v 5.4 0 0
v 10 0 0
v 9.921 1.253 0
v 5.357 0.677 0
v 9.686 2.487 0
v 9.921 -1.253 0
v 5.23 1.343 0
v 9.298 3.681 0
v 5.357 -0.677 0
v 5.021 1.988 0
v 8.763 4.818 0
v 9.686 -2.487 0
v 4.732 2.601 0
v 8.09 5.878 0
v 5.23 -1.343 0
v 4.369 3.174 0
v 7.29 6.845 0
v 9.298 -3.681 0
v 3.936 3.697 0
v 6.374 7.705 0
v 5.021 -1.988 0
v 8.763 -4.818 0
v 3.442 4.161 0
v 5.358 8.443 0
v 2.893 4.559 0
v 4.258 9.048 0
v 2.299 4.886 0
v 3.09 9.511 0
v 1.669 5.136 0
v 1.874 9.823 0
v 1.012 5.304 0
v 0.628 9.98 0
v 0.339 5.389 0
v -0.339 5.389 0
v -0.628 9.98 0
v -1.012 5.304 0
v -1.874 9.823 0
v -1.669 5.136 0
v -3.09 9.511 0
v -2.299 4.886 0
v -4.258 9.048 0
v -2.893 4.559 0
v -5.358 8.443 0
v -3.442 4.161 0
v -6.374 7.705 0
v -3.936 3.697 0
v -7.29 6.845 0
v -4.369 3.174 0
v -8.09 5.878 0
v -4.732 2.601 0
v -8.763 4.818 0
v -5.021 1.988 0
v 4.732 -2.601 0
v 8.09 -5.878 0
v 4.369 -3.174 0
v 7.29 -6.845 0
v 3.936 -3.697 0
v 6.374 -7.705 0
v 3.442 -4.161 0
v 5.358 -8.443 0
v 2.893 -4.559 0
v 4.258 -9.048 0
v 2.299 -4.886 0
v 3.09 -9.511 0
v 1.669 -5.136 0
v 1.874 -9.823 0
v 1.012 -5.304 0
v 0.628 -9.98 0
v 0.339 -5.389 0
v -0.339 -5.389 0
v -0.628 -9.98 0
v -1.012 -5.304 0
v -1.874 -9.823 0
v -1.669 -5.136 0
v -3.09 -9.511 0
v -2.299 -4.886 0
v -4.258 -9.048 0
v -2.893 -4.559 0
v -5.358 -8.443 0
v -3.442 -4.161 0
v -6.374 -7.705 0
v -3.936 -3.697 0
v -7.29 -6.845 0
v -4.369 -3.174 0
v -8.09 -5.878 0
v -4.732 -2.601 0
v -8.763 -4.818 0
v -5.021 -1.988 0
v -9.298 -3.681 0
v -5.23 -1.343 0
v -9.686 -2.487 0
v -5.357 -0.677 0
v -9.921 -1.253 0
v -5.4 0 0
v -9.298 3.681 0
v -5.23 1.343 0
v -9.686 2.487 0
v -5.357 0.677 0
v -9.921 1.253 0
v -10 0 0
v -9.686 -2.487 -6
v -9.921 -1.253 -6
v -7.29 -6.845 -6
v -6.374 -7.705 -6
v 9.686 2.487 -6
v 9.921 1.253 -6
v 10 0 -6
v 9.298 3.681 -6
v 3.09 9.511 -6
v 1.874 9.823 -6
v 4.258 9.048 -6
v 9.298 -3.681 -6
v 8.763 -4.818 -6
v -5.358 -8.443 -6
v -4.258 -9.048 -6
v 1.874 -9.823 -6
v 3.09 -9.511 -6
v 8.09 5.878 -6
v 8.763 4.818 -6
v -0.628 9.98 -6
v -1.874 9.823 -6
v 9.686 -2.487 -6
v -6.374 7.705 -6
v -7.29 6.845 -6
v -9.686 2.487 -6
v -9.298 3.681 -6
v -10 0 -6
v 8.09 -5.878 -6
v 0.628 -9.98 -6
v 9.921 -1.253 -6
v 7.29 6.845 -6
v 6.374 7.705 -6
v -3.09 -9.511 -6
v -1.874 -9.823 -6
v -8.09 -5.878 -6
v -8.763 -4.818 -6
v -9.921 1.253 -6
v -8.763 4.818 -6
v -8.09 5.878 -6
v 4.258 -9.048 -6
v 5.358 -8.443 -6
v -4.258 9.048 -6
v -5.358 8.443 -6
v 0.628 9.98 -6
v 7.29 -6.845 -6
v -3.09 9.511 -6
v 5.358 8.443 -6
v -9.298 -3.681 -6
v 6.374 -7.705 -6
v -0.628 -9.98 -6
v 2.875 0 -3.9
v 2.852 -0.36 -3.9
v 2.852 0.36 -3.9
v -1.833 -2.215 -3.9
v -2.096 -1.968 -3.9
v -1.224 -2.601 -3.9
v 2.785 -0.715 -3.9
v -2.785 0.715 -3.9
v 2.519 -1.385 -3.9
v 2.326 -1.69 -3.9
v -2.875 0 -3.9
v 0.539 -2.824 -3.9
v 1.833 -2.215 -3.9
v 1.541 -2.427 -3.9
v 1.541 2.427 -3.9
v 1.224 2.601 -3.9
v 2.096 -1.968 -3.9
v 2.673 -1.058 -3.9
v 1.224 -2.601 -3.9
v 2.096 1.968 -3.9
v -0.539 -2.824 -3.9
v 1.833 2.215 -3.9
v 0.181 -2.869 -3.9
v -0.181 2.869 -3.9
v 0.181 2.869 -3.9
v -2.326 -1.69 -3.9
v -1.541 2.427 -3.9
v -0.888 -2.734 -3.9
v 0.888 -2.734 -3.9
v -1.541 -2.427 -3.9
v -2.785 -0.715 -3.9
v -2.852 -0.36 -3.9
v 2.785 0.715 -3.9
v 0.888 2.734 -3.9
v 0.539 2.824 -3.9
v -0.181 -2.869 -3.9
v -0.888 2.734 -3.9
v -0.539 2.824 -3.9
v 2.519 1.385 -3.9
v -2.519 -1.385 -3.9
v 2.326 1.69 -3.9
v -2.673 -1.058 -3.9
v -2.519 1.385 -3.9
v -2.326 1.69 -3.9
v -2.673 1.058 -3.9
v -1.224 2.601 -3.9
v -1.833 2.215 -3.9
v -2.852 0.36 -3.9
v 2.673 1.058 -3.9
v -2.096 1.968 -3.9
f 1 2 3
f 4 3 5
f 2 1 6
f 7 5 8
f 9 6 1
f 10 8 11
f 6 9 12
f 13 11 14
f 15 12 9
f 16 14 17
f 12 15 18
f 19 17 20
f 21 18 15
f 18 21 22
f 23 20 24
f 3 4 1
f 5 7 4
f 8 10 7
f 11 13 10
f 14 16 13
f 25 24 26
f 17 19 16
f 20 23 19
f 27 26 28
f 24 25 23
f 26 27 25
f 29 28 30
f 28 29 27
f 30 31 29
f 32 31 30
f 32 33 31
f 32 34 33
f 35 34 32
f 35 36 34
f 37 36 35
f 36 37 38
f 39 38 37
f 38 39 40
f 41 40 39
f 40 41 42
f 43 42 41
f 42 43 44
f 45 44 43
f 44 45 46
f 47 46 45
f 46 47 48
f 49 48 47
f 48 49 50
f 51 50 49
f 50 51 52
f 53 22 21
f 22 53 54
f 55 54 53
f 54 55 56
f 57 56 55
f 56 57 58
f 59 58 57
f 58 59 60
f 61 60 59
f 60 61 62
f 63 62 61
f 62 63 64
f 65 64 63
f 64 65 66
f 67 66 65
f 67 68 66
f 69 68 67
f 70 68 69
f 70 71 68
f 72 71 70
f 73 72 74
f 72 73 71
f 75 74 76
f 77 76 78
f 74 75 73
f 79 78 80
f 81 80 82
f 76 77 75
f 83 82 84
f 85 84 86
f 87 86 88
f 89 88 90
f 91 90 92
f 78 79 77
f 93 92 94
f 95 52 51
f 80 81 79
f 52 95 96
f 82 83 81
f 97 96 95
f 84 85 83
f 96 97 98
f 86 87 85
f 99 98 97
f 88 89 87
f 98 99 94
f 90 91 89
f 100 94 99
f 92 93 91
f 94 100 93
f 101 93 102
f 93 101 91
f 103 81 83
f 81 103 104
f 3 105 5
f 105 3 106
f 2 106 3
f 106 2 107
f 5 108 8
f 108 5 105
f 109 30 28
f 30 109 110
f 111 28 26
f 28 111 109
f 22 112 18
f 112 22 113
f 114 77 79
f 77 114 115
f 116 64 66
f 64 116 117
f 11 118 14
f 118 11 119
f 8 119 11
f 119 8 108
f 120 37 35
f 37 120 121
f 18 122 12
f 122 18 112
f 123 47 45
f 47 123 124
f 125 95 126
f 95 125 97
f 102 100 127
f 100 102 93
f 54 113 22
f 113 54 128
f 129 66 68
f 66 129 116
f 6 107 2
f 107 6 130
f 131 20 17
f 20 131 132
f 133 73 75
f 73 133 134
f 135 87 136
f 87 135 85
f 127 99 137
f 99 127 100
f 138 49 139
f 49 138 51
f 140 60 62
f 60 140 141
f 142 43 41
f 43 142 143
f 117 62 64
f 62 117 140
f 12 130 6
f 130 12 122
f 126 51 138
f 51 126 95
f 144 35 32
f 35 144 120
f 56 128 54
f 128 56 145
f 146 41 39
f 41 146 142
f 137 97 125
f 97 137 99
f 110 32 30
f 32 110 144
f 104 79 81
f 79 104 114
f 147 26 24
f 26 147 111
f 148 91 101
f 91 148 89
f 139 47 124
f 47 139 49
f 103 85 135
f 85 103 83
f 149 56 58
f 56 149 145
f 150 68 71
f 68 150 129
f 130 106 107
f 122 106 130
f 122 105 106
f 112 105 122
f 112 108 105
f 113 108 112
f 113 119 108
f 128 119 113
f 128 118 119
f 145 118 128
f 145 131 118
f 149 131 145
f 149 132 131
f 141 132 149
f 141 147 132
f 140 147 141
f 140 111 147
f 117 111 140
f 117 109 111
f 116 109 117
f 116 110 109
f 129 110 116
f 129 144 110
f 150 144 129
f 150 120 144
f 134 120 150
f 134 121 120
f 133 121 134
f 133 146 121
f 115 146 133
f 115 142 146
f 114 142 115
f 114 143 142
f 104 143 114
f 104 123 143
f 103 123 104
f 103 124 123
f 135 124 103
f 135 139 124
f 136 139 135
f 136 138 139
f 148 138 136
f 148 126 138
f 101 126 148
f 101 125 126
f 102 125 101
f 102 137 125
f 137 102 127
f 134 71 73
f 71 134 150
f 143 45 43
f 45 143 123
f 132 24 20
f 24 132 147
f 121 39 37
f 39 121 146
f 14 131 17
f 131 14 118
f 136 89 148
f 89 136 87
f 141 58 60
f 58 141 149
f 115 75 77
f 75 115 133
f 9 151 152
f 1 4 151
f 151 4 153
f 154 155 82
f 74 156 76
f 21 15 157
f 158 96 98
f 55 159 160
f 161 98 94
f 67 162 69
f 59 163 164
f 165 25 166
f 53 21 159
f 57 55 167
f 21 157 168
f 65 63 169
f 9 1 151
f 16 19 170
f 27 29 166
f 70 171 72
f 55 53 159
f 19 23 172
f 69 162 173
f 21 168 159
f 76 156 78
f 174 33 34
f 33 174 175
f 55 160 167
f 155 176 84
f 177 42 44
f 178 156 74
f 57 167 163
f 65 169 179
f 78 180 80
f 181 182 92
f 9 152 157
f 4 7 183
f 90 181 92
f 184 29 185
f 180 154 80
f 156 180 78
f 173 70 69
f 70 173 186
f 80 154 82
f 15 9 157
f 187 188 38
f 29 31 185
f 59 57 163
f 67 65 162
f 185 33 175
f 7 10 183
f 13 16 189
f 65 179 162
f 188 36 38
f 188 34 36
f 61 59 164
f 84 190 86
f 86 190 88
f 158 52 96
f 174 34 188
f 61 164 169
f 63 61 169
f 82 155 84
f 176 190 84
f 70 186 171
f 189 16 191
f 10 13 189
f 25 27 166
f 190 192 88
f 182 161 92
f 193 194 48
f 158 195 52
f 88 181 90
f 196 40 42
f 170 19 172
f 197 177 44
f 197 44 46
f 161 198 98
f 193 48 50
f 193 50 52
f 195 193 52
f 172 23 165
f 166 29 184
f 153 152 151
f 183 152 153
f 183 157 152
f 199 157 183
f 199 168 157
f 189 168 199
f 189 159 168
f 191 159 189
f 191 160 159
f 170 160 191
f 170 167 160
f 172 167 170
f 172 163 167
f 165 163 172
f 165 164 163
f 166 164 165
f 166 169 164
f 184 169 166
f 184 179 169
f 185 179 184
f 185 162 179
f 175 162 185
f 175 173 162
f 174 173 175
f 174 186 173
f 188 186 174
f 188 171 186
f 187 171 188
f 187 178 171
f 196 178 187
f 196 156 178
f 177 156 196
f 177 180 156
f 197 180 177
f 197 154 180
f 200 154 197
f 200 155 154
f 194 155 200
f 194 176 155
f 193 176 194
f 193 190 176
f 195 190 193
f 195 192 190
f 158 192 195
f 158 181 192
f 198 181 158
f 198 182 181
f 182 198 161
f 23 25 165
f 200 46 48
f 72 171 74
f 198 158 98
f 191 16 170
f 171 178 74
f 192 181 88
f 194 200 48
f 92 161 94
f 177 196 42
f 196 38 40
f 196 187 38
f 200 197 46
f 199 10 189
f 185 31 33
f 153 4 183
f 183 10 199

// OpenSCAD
$fn = 50;


difference() {
	union() {
		translate(v = [0, 0, -3.0000000000]) {
			cylinder(h = 3, r = 7.0000000000);
		}
		translate(v = [0, 0, -6.0000000000]) {
			cylinder(h = 6, r = 10.0000000000);
		}
	}
	union() {
		translate(v = [0, 0, 0]) {
			rotate(a = [0, 0, 0]) {
				difference() {
					union() {
						#translate(v = [0, 0, -3.0000000000]) {
							cylinder(h = 3, r = 2.6000000000);
						}
						#translate(v = [0, 0, -3.9000000000]) {
							cylinder(h = 3.9000000000, r = 7.0000000000, r1 = 2.8750000000, r2 = 5.4000000000);
						}
						#translate(v = [0, 0, -3.0000000000]) {
							cylinder(h = 3, r = 2.8750000000);
						}
						#translate(v = [0, 0, -3.0000000000]) {
							cylinder(h = 3, r = 2.6000000000);
						}
					}
					union();
				}
			}
		}
	}
}
